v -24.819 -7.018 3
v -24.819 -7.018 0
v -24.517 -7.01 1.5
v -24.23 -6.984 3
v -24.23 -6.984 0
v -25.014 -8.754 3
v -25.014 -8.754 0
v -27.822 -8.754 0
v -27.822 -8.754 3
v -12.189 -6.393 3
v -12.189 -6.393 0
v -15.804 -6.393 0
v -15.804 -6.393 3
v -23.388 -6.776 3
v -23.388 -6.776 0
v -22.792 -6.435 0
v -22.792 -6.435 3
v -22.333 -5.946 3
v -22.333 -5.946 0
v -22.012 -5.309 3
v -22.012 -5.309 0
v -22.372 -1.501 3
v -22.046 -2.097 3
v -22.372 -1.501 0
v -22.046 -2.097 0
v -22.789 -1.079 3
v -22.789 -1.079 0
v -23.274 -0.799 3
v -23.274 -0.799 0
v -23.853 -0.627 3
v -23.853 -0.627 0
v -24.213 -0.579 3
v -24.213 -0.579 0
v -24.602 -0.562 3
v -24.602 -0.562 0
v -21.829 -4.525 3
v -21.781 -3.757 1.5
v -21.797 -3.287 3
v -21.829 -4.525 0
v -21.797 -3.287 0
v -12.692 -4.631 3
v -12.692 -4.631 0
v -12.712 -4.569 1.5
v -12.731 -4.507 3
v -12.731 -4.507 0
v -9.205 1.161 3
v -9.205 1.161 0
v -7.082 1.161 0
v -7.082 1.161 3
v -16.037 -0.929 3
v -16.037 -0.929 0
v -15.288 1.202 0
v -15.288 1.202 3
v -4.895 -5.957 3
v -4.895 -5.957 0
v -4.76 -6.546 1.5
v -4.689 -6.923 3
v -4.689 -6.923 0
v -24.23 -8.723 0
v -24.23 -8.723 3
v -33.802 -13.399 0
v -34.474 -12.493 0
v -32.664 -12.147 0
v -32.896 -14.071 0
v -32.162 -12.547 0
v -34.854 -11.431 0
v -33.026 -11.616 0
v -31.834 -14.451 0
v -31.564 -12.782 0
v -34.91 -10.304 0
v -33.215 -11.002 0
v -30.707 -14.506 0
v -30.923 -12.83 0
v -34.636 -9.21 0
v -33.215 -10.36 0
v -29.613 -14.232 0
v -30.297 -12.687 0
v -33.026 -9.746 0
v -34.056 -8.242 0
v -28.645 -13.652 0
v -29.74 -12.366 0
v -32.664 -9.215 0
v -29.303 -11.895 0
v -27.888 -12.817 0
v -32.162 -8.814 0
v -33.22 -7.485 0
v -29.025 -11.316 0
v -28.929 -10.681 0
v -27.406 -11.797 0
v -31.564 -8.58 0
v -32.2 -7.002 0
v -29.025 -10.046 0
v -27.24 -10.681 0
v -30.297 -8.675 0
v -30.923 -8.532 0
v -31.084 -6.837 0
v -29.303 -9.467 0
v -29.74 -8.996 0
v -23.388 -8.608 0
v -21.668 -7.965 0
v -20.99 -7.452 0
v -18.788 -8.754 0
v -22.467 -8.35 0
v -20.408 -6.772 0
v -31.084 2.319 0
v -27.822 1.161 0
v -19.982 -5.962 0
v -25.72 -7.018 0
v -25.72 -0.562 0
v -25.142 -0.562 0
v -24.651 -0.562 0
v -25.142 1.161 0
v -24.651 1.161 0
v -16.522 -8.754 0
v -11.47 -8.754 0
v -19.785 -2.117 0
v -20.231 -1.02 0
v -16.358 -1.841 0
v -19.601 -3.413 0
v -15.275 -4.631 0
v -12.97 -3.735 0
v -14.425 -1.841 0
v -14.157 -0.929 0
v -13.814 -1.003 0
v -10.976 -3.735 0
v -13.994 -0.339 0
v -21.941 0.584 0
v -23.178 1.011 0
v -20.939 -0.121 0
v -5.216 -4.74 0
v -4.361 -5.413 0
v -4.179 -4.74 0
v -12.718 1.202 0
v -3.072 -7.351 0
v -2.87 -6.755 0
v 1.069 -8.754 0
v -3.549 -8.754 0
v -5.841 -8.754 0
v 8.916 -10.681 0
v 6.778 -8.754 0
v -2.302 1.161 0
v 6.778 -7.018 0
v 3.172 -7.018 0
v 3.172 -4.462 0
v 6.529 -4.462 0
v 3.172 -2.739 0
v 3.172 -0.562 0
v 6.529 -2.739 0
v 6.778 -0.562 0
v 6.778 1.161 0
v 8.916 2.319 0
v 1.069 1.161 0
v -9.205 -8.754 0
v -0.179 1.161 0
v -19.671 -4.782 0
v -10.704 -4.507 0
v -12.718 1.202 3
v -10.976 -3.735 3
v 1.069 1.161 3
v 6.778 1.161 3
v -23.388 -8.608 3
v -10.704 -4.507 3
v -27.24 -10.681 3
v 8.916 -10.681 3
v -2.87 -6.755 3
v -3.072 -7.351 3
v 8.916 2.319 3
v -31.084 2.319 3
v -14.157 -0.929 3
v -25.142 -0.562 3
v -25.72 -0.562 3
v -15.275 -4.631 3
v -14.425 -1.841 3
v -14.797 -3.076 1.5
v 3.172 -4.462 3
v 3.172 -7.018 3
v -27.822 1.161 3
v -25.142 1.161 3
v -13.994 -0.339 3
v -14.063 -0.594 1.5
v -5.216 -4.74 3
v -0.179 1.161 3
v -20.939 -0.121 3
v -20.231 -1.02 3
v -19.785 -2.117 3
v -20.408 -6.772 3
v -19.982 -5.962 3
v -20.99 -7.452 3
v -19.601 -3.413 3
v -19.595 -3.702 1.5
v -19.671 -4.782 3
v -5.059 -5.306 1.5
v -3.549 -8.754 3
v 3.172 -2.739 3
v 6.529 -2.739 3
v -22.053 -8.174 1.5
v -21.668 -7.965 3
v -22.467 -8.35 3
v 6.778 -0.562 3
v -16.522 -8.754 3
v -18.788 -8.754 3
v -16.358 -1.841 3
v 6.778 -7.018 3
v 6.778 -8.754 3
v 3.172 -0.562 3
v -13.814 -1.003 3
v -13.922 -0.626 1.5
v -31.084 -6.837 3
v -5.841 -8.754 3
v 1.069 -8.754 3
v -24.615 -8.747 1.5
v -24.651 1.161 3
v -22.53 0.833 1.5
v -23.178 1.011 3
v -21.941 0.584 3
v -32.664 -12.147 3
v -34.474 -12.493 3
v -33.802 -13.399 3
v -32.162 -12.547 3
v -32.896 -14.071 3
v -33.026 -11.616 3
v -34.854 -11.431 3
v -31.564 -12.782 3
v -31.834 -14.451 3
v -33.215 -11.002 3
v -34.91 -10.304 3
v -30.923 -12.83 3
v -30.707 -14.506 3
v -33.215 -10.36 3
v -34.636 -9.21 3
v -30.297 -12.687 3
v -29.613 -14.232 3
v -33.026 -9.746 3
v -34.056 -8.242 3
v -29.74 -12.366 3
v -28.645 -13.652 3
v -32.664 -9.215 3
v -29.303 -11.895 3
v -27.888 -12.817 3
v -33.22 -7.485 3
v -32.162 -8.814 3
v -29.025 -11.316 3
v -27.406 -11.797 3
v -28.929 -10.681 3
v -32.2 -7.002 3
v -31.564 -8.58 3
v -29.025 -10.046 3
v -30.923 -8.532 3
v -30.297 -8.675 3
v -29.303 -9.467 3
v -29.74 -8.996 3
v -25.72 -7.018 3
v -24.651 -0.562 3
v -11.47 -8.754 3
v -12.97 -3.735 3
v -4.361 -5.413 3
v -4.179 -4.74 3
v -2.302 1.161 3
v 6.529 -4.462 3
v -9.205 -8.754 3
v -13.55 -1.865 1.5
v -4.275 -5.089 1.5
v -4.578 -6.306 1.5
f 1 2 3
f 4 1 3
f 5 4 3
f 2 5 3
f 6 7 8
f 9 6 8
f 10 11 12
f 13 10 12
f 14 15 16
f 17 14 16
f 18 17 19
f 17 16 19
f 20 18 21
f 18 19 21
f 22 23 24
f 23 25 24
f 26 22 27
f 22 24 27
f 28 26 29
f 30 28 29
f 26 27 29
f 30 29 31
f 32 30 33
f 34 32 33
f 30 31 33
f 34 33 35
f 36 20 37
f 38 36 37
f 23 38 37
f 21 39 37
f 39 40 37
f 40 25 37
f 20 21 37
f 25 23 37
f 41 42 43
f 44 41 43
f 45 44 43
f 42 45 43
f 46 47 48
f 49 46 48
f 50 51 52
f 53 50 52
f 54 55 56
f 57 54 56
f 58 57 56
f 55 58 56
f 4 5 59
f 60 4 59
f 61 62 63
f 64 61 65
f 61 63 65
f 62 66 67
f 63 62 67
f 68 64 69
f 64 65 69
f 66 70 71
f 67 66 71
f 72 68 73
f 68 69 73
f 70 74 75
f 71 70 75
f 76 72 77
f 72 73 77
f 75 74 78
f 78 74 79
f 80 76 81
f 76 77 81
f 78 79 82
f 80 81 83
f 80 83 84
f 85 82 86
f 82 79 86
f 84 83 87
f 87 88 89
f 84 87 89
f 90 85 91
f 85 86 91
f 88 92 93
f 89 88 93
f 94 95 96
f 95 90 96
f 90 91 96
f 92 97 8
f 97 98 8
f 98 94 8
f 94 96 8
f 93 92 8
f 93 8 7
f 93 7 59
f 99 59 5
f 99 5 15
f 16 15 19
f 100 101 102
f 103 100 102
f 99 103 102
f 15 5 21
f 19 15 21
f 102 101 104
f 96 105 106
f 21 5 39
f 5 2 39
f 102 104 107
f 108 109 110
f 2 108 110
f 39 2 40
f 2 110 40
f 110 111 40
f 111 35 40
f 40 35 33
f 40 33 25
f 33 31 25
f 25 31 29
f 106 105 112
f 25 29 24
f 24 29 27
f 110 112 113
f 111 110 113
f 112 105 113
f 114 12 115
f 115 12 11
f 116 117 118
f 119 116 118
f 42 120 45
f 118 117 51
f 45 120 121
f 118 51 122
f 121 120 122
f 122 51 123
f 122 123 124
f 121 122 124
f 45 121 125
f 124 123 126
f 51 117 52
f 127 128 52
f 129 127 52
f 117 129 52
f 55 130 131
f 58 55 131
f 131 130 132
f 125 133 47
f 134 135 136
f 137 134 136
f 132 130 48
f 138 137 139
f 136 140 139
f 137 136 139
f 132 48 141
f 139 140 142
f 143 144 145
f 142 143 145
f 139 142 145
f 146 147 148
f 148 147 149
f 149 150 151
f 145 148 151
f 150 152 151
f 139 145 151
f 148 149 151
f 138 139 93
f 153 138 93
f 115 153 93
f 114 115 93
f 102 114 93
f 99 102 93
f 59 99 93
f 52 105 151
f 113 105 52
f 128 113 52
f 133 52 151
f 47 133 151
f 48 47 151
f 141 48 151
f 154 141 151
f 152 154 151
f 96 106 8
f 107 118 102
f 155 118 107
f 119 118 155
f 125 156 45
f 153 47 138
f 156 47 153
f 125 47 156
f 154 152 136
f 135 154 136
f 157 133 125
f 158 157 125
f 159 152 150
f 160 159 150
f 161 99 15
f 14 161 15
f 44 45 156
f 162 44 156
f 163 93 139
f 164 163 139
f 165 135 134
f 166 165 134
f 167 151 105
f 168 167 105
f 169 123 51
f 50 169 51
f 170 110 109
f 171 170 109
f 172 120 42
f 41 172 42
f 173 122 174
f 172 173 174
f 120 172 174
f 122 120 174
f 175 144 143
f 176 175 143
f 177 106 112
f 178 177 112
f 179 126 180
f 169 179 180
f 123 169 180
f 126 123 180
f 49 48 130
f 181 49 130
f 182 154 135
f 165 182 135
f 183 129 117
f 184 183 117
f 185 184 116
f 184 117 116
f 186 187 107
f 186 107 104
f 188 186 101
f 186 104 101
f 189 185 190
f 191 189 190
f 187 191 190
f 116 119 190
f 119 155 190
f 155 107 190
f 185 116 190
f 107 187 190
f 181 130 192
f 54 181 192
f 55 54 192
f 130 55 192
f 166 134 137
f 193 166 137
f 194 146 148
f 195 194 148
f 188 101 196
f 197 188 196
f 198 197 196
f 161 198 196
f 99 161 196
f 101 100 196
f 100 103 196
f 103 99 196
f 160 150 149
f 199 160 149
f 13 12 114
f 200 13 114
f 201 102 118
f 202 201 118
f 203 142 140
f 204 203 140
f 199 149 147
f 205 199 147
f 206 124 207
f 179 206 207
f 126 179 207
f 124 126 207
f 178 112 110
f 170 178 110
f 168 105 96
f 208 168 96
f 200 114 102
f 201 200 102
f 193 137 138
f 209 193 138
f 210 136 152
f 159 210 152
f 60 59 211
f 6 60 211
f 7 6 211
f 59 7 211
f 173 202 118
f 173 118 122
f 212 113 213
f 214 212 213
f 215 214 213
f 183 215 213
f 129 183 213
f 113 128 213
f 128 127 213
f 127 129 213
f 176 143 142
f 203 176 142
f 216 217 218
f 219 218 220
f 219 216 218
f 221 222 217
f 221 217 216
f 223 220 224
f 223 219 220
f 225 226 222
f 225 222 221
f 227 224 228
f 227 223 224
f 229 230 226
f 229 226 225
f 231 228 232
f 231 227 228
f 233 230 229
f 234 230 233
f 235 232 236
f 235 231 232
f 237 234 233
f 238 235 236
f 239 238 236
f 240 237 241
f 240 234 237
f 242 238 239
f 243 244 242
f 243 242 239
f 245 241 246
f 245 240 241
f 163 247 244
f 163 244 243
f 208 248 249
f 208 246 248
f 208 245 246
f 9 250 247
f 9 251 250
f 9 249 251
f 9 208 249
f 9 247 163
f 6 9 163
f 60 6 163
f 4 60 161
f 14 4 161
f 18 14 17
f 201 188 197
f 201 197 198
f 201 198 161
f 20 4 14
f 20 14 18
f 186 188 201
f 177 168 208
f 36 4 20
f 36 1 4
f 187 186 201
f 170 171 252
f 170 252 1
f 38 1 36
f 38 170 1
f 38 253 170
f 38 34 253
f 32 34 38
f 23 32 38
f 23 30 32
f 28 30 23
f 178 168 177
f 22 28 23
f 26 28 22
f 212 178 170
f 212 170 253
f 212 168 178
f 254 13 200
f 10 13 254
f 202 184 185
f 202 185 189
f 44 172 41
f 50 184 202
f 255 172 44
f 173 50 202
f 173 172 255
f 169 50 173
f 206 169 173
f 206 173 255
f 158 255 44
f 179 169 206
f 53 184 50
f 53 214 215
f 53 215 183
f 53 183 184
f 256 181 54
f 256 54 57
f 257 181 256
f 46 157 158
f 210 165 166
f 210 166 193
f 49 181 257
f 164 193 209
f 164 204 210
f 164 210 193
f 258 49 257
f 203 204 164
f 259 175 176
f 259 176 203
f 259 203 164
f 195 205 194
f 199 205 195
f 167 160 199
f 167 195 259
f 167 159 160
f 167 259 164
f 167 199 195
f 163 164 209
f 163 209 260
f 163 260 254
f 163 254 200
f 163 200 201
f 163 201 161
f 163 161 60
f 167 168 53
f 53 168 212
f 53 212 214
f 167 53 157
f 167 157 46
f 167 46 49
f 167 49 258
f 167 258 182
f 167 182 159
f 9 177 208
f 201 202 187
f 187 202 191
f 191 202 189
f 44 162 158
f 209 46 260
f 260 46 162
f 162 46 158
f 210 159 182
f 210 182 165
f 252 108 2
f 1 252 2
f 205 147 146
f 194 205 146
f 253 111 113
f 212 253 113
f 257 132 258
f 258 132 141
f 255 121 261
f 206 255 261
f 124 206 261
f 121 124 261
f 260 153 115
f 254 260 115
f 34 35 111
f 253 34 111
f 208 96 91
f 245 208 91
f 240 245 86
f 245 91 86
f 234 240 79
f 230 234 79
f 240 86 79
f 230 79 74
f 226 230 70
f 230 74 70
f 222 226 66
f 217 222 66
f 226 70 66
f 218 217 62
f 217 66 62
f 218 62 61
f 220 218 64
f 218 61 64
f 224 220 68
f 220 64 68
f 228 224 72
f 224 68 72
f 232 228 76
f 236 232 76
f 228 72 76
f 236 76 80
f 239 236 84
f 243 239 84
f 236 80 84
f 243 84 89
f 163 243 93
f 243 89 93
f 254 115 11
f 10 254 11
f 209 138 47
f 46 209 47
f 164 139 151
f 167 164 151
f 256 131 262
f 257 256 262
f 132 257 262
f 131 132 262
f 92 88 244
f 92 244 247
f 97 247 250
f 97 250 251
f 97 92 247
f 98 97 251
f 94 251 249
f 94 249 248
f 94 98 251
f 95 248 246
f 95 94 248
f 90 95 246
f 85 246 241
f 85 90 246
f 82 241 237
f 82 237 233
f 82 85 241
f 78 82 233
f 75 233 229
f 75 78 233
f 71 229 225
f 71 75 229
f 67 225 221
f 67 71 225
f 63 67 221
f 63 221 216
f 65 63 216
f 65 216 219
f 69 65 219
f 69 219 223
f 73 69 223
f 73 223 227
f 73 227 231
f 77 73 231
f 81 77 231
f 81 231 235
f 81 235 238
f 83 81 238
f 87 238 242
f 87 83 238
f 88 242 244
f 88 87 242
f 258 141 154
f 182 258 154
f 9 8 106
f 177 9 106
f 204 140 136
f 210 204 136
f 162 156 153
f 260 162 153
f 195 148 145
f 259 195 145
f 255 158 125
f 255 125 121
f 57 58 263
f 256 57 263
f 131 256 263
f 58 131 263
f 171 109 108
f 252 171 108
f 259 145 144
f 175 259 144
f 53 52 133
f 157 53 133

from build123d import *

# Parameters (mm, degrees)
F0_R     = 2.1552668946
F1_DEPTH = 3
F2_DEPTH = 3
F3_DEPTH = 3


# Not quite as in the source:
# - a feature names something its author has since deleted; it is built from what else it names


with BuildPart() as f1:
    # F0 (on Top) → F1 (new body)
    with BuildSketch(Plane.XY):
        with BuildLine():
            Line((8.9158927649, 2.3191112205), (-31.0841072351, 2.3191112205))
            Line((-31.0841072351, 2.3191112205), (-31.0841072351, -6.8367764676))
            ThreePointArc((-31.0841072351, -6.8367764676), (-29.2190156428, -7.3195448787), (-27.8223845073, -8.6465917722))
            Line((-27.8223845073, -8.6465917722), (-27.8223845073, 1.160879073))
            Line((-27.8223845073, 1.160879073), (-25.1418892294, 1.160879073))
            Line((-25.1418892294, 1.160879073), (-24.7104053406, 1.160879073))
            add(Edge.make_bspline(
                [(-24.7104053406, 1.160879073), (-24.680544405, 1.160879073), (-24.6508475393, 1.1606853064)],
                knots=[0, 0, 0, 0.0122966212, 0.0122966212, 0.0122966212], degree=2))
            add(Edge.make_bspline(
                [(-24.6508475393, 1.1606853064), (-22.2655016763, 1.1451213586), (-20.9387039517, -0.1205879408)],
                knots=[0.0122966212, 0.0122966212, 0.0122966212, 1, 1, 1], degree=2))
            add(Edge.make_bspline(
                [(-20.9387039517, -0.1205879408), (-19.5953879795, -1.4020549547), (-19.5953879795, -3.702402177)],
                knots=[0, 0, 0, 1, 1, 1], degree=2))
            add(Edge.make_bspline(
                [(-19.5953879795, -3.702402177), (-19.5953879795, -6.1503188436), (-20.9897022156, -7.452402177)],
                knots=[0, 0, 0, 1, 1, 1], degree=2))
            add(Edge.make_bspline(
                [(-20.9897022156, -7.452402177), (-21.9161308918, -8.3175495789), (-23.3881715685, -8.60786432)],
                knots=[0, 0, 0, 0.6644332047, 0.6644332047, 0.6644332047], degree=2))
            add(Edge.make_bspline(
                [(-23.3881715685, -8.60786432), (-23.7888512634, -8.6868860643), (-24.2299549282, -8.7233189027)],
                knots=[0.6644332047, 0.6644332047, 0.6644332047, 0.8452875098, 0.8452875098, 0.8452875098], degree=2))
            add(Edge.make_bspline(
                [(-24.2299549282, -8.7233189027), (-24.6072987041, -8.7544855103), (-25.0142247851, -8.7544855103)],
                knots=[0.8452875098, 0.8452875098, 0.8452875098, 1, 1, 1], degree=2))
            Line((-25.0142247851, -8.7544855103), (-27.7575219121, -8.7544855103))
            ThreePointArc((-27.7575219121, -8.7544855103), (-27.3716304969, -9.6835343114), (-27.2399949232, -10.6808887795))
            Line((-27.2399949232, -10.6808887795), (8.9158927649, -10.6808887795))
            Line((8.9158927649, -10.6808887795), (8.9158927649, 2.3191112205))
        make_face()
        Polygon((-10.9760084531, -3.7350449711), (-10.7037159156, -4.5066806488), (-9.2047629795, -8.7544855103), (-11.4703879795, -8.7544855103), (-12.1887039517, -6.3933743992), (-15.8041553406, -6.3933743992), (-16.5224713128, -8.7544855103), (-18.7880963128, -8.7544855103), (-16.3575375911, -1.8410302), (-16.0369298862, -0.9290970629), (-15.2876622851, 1.2021117119), (-12.7182178406, 1.2021117119), align=None, mode=Mode.SUBTRACT)
        with BuildLine():
            Line((-0.1791553406, 1.160879073), (-2.8697243415, -6.7549031323))
            Line((-2.8697243415, -6.7549031323), (-3.0723898417, -7.3511546909))
            Line((-3.0723898417, -7.3511546909), (-3.5493810351, -8.7544855103))
            Line((-3.5493810351, -8.7544855103), (-5.8410477017, -8.7544855103))
            Line((-5.8410477017, -8.7544855103), (-9.2047629795, 1.160879073))
            Line((-9.2047629795, 1.160879073), (-7.0823671462, 1.160879073))
            Line((-7.0823671462, 1.160879073), (-5.2160477017, -4.7397285658))
            add(Edge.make_bspline(
                [(-5.2160477017, -4.7397285658), (-5.0619678406, -5.2627320381), (-4.8948671462, -5.9571764825)],
                knots=[0, 0, 0, 1, 1, 1], degree=2))
            add(Edge.make_bspline(
                [(-4.8948671462, -5.9571764825), (-4.7277664517, -6.651620927), (-4.6887039517, -6.9228882881)],
                knots=[0, 0, 0, 1, 1, 1], degree=2))
            add(Edge.make_bspline(
                [(-4.6887039517, -6.9228882881), (-4.6303623692, -6.4444873114), (-4.360761049, -5.4129699306)],
                knots=[0, 0, 0, 0.7681086064, 0.7681086064, 0.7681086064], degree=2))
            add(Edge.make_bspline(
                [(-4.360761049, -5.4129699306), (-4.2793686191, -5.1015556319), (-4.1787213128, -4.7397285658)],
                knots=[0.7681086064, 0.7681086064, 0.7681086064, 1, 1, 1], degree=2))
            Line((-4.1787213128, -4.7397285658), (-2.301551174, 1.160879073))
            Line((-2.301551174, 1.160879073), (-0.1791553406, 1.160879073))
        make_face(mode=Mode.SUBTRACT)
        Polygon((6.7783099372, -7.0183743992), (6.7783099372, -8.7544855103), (1.0686745205, -8.7544855103), (1.0686745205, 1.160879073), (6.7783099372, 1.160879073), (6.7783099372, -0.5622112047), (3.1715391038, -0.5622112047), (3.1715391038, -2.7388605103), (6.5287439649, -2.7388605103), (6.5287439649, -4.4619507881), (3.1715391038, -4.4619507881), (3.1715391038, -7.0183743992), align=None, mode=Mode.SUBTRACT)
        with BuildLine():
            ThreePointArc((-27.8223845073, -8.6465917722), (-29.2190156428, -7.3195448787), (-31.0841072351, -6.8367764676))
            ThreePointArc((-31.0841072351, -6.8367764676), (-33.8023051185, -13.3990866629), (-27.2399949232, -10.6808887795))
            ThreePointArc((-27.2399949232, -10.6808887795), (-27.3716304969, -9.6835343114), (-27.7575219121, -8.7544855103))
            Line((-27.7575219121, -8.7544855103), (-27.8223845073, -8.7544855103))
            Line((-27.8223845073, -8.7544855103), (-27.8223845073, -8.6465917722))
        make_face()
        with Locations((-31.0841072351, -10.6808887795)):
            Circle(F0_R, mode=Mode.SUBTRACT)
        with BuildLine():
            Line((-24.6508475393, -0.5622112047), (-25.1418892294, -0.5622112047))
            Line((-25.1418892294, -0.5622112047), (-25.719519924, -0.5622112047))
            Line((-25.719519924, -0.5622112047), (-25.719519924, -7.0183743992))
            Line((-25.719519924, -7.0183743992), (-24.8189122851, -7.0183743992))
            add(Edge.make_bspline(
                [(-24.8189122851, -7.0183743992), (-24.5085848668, -7.0183743992), (-24.2299549282, -6.9843448907)],
                knots=[0, 0, 0, 0.1021420531, 0.1021420531, 0.1021420531], degree=2))
            add(Edge.make_bspline(
                [(-24.2299549282, -6.9843448907), (-23.7649142238, -6.9275487449), (-23.3881715685, -6.7759583364)],
                knots=[0.1021420531, 0.1021420531, 0.1021420531, 0.2726198293, 0.2726198293, 0.2726198293], degree=2))
            add(Edge.make_bspline(
                [(-23.3881715685, -6.7759583364), (-21.7807178406, -6.1291651903), (-21.7807178406, -3.7566556492)],
                knots=[0.2726198293, 0.2726198293, 0.2726198293, 1, 1, 1], degree=2))
            add(Edge.make_bspline(
                [(-21.7807178406, -3.7566556492), (-21.7807178406, -0.5622112047), (-24.6018983962, -0.5622112047)],
                knots=[0, 0, 0, 1, 1, 1], degree=2))
            Line((-24.6018983962, -0.5622112047), (-24.6508475393, -0.5622112047))
        make_face()
        with BuildLine():
            add(Edge.make_bspline(
                [(-12.692176174, -4.6312216214), (-12.7116804628, -4.5684169616), (-12.7308511011, -4.5066806488)],
                knots=[0, 0, 0, 0.0195807762, 0.0195807762, 0.0195807762], degree=2))
            add(Edge.make_bspline(
                [(-12.7308511011, -4.5066806488), (-12.8579477675, -4.0973839213), (-12.9703792713, -3.7350449711)],
                knots=[0.0195807762, 0.0195807762, 0.0195807762, 0.1493965567, 0.1493965567, 0.1493965567], degree=2))
            add(Edge.make_bspline(
                [(-12.9703792713, -3.7350449711), (-13.7070741781, -1.3608593558), (-13.8141379795, -1.0027493992)],
                knots=[0.1493965567, 0.1493965567, 0.1493965567, 1, 1, 1], degree=2))
            add(Edge.make_bspline(
                [(-13.8141379795, -1.0027493992), (-13.9400060351, -0.5817424547), (-13.9942595073, -0.3386868992)],
                knots=[0, 0, 0, 1, 1, 1], degree=2))
            add(Edge.make_bspline(
                [(-13.9942595073, -0.3386868992), (-14.0498886573, -0.5547224332), (-14.1571325889, -0.9290970629)],
                knots=[0, 0, 0, 0.2488729353, 0.2488729353, 0.2488729353], degree=2))
            add(Edge.make_bspline(
                [(-14.1571325889, -0.9290970629), (-14.2648638581, -1.3051729247), (-14.4246800702, -1.8410302)],
                knots=[0.2488729353, 0.2488729353, 0.2488729353, 0.4988767982, 0.4988767982, 0.4988767982], degree=2))
            add(Edge.make_bspline(
                [(-14.4246800702, -1.8410302), (-14.7450255679, -2.915135657), (-15.2746414517, -4.6312216214)],
                knots=[0.4988767982, 0.4988767982, 0.4988767982, 1, 1, 1], degree=2))
            Line((-15.2746414517, -4.6312216214), (-12.692176174, -4.6312216214))
        make_face()
        with BuildLine():
            Line((-16.3575375911, -1.8410302), (-14.4246800702, -1.8410302))
            add(Edge.make_bspline(
                [(-14.1571325889, -0.9290970629), (-14.2648638581, -1.3051729247), (-14.4246800702, -1.8410302)],
                knots=[0.2488729353, 0.2488729353, 0.2488729353, 0.4988767982, 0.4988767982, 0.4988767982], degree=2))
            Line((-14.1571325889, -0.9290970629), (-16.0369298862, -0.9290970629))
            Line((-16.0369298862, -0.9290970629), (-16.3575375911, -1.8410302))
        make_face()
        with BuildLine():
            add(Edge.make_bspline(
                [(-12.7308511011, -4.5066806488), (-12.8579477675, -4.0973839213), (-12.9703792713, -3.7350449711)],
                knots=[0.0195807762, 0.0195807762, 0.0195807762, 0.1493965567, 0.1493965567, 0.1493965567], degree=2))
            Line((-12.7308511011, -4.5066806488), (-10.7037159156, -4.5066806488))
            Line((-10.7037159156, -4.5066806488), (-10.9760084531, -3.7350449711))
            Line((-10.9760084531, -3.7350449711), (-12.9703792713, -3.7350449711))
        make_face()
        with BuildLine():
            Line((-24.2299549282, -6.9843448907), (-24.2299549282, -8.7233189027))
            add(Edge.make_bspline(
                [(-23.3881715685, -8.60786432), (-23.7888512634, -8.6868860643), (-24.2299549282, -8.7233189027)],
                knots=[0.6644332047, 0.6644332047, 0.6644332047, 0.8452875098, 0.8452875098, 0.8452875098], degree=2))
            Line((-23.3881715685, -8.60786432), (-23.3881715685, -6.7759583364))
            add(Edge.make_bspline(
                [(-24.2299549282, -6.9843448907), (-23.7649142238, -6.9275487449), (-23.3881715685, -6.7759583364)],
                knots=[0.1021420531, 0.1021420531, 0.1021420531, 0.2726198293, 0.2726198293, 0.2726198293], degree=2))
        make_face()
        with BuildLine():
            Line((-24.7104053406, 1.160879073), (-25.1418892294, 1.160879073))
            Line((-25.1418892294, 1.160879073), (-25.1418892294, -0.5622112047))
            Line((-25.1418892294, -0.5622112047), (-24.6508475393, -0.5622112047))
            Line((-24.6508475393, -0.5622112047), (-24.6508475393, 1.1606853064))
            add(Edge.make_bspline(
                [(-24.7104053406, 1.160879073), (-24.680544405, 1.160879073), (-24.6508475393, 1.1606853064)],
                knots=[0, 0, 0, 0.0122966212, 0.0122966212, 0.0122966212], degree=2))
        make_face()
    extrude(amount=F1_DEPTH)

    # F0 (on Top) → F2 (join)
    with BuildSketch(Plane.XY):
        with BuildLine():
            ThreePointArc((-27.8223845073, -8.6465917722), (-29.2190156428, -7.3195448787), (-31.0841072351, -6.8367764676))
            ThreePointArc((-31.0841072351, -6.8367764676), (-33.8023051185, -13.3990866629), (-27.2399949232, -10.6808887795))
            ThreePointArc((-27.2399949232, -10.6808887795), (-27.3716304969, -9.6835343114), (-27.7575219121, -8.7544855103))
            Line((-27.7575219121, -8.7544855103), (-27.8223845073, -8.7544855103))
            Line((-27.8223845073, -8.7544855103), (-27.8223845073, -8.6465917722))
        make_face()
        with Locations((-31.0841072351, -10.6808887795)):
            Circle(F0_R, mode=Mode.SUBTRACT)
    extrude(amount=F2_DEPTH)

    # F0 (on Top) → F3 (join)
    with BuildSketch(Plane.XY):
        with BuildLine():
            Line((8.9158927649, 2.3191112205), (-31.0841072351, 2.3191112205))
            Line((-31.0841072351, 2.3191112205), (-31.0841072351, -6.8367764676))
            ThreePointArc((-31.0841072351, -6.8367764676), (-29.2190156428, -7.3195448787), (-27.8223845073, -8.6465917722))
            Line((-27.8223845073, -8.6465917722), (-27.8223845073, 1.160879073))
            Line((-27.8223845073, 1.160879073), (-25.1418892294, 1.160879073))
            Line((-25.1418892294, 1.160879073), (-24.7104053406, 1.160879073))
            add(Edge.make_bspline(
                [(-24.7104053406, 1.160879073), (-24.680544405, 1.160879073), (-24.6508475393, 1.1606853064)],
                knots=[0, 0, 0, 0.0122966212, 0.0122966212, 0.0122966212], degree=2))
            add(Edge.make_bspline(
                [(-24.6508475393, 1.1606853064), (-22.2655016763, 1.1451213586), (-20.9387039517, -0.1205879408)],
                knots=[0.0122966212, 0.0122966212, 0.0122966212, 1, 1, 1], degree=2))
            add(Edge.make_bspline(
                [(-20.9387039517, -0.1205879408), (-19.5953879795, -1.4020549547), (-19.5953879795, -3.702402177)],
                knots=[0, 0, 0, 1, 1, 1], degree=2))
            add(Edge.make_bspline(
                [(-19.5953879795, -3.702402177), (-19.5953879795, -6.1503188436), (-20.9897022156, -7.452402177)],
                knots=[0, 0, 0, 1, 1, 1], degree=2))
            add(Edge.make_bspline(
                [(-20.9897022156, -7.452402177), (-21.9161308918, -8.3175495789), (-23.3881715685, -8.60786432)],
                knots=[0, 0, 0, 0.6644332047, 0.6644332047, 0.6644332047], degree=2))
            add(Edge.make_bspline(
                [(-23.3881715685, -8.60786432), (-23.7888512634, -8.6868860643), (-24.2299549282, -8.7233189027)],
                knots=[0.6644332047, 0.6644332047, 0.6644332047, 0.8452875098, 0.8452875098, 0.8452875098], degree=2))
            add(Edge.make_bspline(
                [(-24.2299549282, -8.7233189027), (-24.6072987041, -8.7544855103), (-25.0142247851, -8.7544855103)],
                knots=[0.8452875098, 0.8452875098, 0.8452875098, 1, 1, 1], degree=2))
            Line((-25.0142247851, -8.7544855103), (-27.7575219121, -8.7544855103))
            ThreePointArc((-27.7575219121, -8.7544855103), (-27.3716304969, -9.6835343114), (-27.2399949232, -10.6808887795))
            Line((-27.2399949232, -10.6808887795), (8.9158927649, -10.6808887795))
            Line((8.9158927649, -10.6808887795), (8.9158927649, 2.3191112205))
        make_face()
        Polygon((-10.9760084531, -3.7350449711), (-10.7037159156, -4.5066806488), (-9.2047629795, -8.7544855103), (-11.4703879795, -8.7544855103), (-12.1887039517, -6.3933743992), (-15.8041553406, -6.3933743992), (-16.5224713128, -8.7544855103), (-18.7880963128, -8.7544855103), (-16.3575375911, -1.8410302), (-16.0369298862, -0.9290970629), (-15.2876622851, 1.2021117119), (-12.7182178406, 1.2021117119), align=None, mode=Mode.SUBTRACT)
        with BuildLine():
            Line((-0.1791553406, 1.160879073), (-2.8697243415, -6.7549031323))
            Line((-2.8697243415, -6.7549031323), (-3.0723898417, -7.3511546909))
            Line((-3.0723898417, -7.3511546909), (-3.5493810351, -8.7544855103))
            Line((-3.5493810351, -8.7544855103), (-5.8410477017, -8.7544855103))
            Line((-5.8410477017, -8.7544855103), (-9.2047629795, 1.160879073))
            Line((-9.2047629795, 1.160879073), (-7.0823671462, 1.160879073))
            Line((-7.0823671462, 1.160879073), (-5.2160477017, -4.7397285658))
            add(Edge.make_bspline(
                [(-5.2160477017, -4.7397285658), (-5.0619678406, -5.2627320381), (-4.8948671462, -5.9571764825)],
                knots=[0, 0, 0, 1, 1, 1], degree=2))
            add(Edge.make_bspline(
                [(-4.8948671462, -5.9571764825), (-4.7277664517, -6.651620927), (-4.6887039517, -6.9228882881)],
                knots=[0, 0, 0, 1, 1, 1], degree=2))
            add(Edge.make_bspline(
                [(-4.6887039517, -6.9228882881), (-4.6303623692, -6.4444873114), (-4.360761049, -5.4129699306)],
                knots=[0, 0, 0, 0.7681086064, 0.7681086064, 0.7681086064], degree=2))
            add(Edge.make_bspline(
                [(-4.360761049, -5.4129699306), (-4.2793686191, -5.1015556319), (-4.1787213128, -4.7397285658)],
                knots=[0.7681086064, 0.7681086064, 0.7681086064, 1, 1, 1], degree=2))
            Line((-4.1787213128, -4.7397285658), (-2.301551174, 1.160879073))
            Line((-2.301551174, 1.160879073), (-0.1791553406, 1.160879073))
        make_face(mode=Mode.SUBTRACT)
        Polygon((6.7783099372, -7.0183743992), (6.7783099372, -8.7544855103), (1.0686745205, -8.7544855103), (1.0686745205, 1.160879073), (6.7783099372, 1.160879073), (6.7783099372, -0.5622112047), (3.1715391038, -0.5622112047), (3.1715391038, -2.7388605103), (6.5287439649, -2.7388605103), (6.5287439649, -4.4619507881), (3.1715391038, -4.4619507881), (3.1715391038, -7.0183743992), align=None, mode=Mode.SUBTRACT)
        with BuildLine():
            ThreePointArc((-27.8223845073, -8.6465917722), (-29.2190156428, -7.3195448787), (-31.0841072351, -6.8367764676))
            ThreePointArc((-31.0841072351, -6.8367764676), (-33.8023051185, -13.3990866629), (-27.2399949232, -10.6808887795))
            ThreePointArc((-27.2399949232, -10.6808887795), (-27.3716304969, -9.6835343114), (-27.7575219121, -8.7544855103))
            Line((-27.7575219121, -8.7544855103), (-27.8223845073, -8.7544855103))
            Line((-27.8223845073, -8.7544855103), (-27.8223845073, -8.6465917722))
        make_face()
        with Locations((-31.0841072351, -10.6808887795)):
            Circle(F0_R, mode=Mode.SUBTRACT)
    extrude(amount=F3_DEPTH)


solid = f1.part
